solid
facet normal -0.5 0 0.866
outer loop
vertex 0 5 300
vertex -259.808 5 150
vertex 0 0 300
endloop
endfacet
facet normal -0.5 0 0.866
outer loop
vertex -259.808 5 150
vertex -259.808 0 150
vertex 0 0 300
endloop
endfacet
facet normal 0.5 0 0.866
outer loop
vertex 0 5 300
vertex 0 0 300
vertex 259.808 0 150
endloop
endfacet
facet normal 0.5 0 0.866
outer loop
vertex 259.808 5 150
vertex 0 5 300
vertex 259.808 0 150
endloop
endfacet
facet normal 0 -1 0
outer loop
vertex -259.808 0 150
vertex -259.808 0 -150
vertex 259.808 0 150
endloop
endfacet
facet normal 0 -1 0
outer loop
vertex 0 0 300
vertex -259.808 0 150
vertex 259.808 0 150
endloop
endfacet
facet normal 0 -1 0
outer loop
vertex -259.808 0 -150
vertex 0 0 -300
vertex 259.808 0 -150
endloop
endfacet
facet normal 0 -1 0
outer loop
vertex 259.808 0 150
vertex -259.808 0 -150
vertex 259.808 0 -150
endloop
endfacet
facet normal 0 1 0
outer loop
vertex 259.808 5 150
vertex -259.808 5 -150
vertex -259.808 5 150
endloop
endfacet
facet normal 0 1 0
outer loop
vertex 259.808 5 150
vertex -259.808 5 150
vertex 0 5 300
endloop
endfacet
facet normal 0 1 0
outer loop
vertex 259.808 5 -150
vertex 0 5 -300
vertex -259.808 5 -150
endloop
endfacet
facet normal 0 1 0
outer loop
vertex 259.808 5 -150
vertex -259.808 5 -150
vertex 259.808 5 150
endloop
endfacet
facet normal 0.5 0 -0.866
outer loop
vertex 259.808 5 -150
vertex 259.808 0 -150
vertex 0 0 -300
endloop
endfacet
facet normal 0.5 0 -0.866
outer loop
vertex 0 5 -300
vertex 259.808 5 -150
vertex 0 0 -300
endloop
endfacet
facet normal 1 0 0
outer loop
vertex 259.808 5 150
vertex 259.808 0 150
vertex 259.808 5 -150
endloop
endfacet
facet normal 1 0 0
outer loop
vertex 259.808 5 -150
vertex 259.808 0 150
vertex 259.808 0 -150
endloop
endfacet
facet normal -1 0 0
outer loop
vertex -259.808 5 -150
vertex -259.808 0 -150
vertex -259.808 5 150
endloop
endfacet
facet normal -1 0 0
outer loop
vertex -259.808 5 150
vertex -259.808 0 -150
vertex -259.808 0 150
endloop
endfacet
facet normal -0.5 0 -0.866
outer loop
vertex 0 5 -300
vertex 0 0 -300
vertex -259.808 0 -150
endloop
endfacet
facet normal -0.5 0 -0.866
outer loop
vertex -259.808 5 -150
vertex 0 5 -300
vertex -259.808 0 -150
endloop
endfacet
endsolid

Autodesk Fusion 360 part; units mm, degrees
sketch "Sketch1" plane through (0, 0, 0) normal (0, 1, 0) x (1, 0, 0)
  line L0 (0, -300) -> (259.8076, -150)
  line L1 (259.8076, -150) -> (259.8076, 150)
  line L2 (259.8076, 150) -> (0, 300)
  line L3 (0, 300) -> (-259.8076, 150)
  line L4 (-259.8076, 150) -> (-259.8076, -150)
  line L5 (-259.8076, -150) -> (0, -300)
  dimension "d1" = 300
extrude "Extrude1" add sketch "Sketch1" along normal blind 5
sketch "Sketch2" plane through (0, 5, 0) normal (0, 1, 0) x (-1, 0, 0)
  line L0 (259.8076, 150) -> (0, 300)
  line L1 (0, 300) -> (-259.8076, 150)
  line L2 (-259.8076, 150) -> (-259.8076, -150)
  line L3 (-259.8076, -150) -> (0, -300)
  line L4 (0, -300) -> (259.8076, -150)
  line L5 (259.8076, -150) -> (259.8076, 150)
